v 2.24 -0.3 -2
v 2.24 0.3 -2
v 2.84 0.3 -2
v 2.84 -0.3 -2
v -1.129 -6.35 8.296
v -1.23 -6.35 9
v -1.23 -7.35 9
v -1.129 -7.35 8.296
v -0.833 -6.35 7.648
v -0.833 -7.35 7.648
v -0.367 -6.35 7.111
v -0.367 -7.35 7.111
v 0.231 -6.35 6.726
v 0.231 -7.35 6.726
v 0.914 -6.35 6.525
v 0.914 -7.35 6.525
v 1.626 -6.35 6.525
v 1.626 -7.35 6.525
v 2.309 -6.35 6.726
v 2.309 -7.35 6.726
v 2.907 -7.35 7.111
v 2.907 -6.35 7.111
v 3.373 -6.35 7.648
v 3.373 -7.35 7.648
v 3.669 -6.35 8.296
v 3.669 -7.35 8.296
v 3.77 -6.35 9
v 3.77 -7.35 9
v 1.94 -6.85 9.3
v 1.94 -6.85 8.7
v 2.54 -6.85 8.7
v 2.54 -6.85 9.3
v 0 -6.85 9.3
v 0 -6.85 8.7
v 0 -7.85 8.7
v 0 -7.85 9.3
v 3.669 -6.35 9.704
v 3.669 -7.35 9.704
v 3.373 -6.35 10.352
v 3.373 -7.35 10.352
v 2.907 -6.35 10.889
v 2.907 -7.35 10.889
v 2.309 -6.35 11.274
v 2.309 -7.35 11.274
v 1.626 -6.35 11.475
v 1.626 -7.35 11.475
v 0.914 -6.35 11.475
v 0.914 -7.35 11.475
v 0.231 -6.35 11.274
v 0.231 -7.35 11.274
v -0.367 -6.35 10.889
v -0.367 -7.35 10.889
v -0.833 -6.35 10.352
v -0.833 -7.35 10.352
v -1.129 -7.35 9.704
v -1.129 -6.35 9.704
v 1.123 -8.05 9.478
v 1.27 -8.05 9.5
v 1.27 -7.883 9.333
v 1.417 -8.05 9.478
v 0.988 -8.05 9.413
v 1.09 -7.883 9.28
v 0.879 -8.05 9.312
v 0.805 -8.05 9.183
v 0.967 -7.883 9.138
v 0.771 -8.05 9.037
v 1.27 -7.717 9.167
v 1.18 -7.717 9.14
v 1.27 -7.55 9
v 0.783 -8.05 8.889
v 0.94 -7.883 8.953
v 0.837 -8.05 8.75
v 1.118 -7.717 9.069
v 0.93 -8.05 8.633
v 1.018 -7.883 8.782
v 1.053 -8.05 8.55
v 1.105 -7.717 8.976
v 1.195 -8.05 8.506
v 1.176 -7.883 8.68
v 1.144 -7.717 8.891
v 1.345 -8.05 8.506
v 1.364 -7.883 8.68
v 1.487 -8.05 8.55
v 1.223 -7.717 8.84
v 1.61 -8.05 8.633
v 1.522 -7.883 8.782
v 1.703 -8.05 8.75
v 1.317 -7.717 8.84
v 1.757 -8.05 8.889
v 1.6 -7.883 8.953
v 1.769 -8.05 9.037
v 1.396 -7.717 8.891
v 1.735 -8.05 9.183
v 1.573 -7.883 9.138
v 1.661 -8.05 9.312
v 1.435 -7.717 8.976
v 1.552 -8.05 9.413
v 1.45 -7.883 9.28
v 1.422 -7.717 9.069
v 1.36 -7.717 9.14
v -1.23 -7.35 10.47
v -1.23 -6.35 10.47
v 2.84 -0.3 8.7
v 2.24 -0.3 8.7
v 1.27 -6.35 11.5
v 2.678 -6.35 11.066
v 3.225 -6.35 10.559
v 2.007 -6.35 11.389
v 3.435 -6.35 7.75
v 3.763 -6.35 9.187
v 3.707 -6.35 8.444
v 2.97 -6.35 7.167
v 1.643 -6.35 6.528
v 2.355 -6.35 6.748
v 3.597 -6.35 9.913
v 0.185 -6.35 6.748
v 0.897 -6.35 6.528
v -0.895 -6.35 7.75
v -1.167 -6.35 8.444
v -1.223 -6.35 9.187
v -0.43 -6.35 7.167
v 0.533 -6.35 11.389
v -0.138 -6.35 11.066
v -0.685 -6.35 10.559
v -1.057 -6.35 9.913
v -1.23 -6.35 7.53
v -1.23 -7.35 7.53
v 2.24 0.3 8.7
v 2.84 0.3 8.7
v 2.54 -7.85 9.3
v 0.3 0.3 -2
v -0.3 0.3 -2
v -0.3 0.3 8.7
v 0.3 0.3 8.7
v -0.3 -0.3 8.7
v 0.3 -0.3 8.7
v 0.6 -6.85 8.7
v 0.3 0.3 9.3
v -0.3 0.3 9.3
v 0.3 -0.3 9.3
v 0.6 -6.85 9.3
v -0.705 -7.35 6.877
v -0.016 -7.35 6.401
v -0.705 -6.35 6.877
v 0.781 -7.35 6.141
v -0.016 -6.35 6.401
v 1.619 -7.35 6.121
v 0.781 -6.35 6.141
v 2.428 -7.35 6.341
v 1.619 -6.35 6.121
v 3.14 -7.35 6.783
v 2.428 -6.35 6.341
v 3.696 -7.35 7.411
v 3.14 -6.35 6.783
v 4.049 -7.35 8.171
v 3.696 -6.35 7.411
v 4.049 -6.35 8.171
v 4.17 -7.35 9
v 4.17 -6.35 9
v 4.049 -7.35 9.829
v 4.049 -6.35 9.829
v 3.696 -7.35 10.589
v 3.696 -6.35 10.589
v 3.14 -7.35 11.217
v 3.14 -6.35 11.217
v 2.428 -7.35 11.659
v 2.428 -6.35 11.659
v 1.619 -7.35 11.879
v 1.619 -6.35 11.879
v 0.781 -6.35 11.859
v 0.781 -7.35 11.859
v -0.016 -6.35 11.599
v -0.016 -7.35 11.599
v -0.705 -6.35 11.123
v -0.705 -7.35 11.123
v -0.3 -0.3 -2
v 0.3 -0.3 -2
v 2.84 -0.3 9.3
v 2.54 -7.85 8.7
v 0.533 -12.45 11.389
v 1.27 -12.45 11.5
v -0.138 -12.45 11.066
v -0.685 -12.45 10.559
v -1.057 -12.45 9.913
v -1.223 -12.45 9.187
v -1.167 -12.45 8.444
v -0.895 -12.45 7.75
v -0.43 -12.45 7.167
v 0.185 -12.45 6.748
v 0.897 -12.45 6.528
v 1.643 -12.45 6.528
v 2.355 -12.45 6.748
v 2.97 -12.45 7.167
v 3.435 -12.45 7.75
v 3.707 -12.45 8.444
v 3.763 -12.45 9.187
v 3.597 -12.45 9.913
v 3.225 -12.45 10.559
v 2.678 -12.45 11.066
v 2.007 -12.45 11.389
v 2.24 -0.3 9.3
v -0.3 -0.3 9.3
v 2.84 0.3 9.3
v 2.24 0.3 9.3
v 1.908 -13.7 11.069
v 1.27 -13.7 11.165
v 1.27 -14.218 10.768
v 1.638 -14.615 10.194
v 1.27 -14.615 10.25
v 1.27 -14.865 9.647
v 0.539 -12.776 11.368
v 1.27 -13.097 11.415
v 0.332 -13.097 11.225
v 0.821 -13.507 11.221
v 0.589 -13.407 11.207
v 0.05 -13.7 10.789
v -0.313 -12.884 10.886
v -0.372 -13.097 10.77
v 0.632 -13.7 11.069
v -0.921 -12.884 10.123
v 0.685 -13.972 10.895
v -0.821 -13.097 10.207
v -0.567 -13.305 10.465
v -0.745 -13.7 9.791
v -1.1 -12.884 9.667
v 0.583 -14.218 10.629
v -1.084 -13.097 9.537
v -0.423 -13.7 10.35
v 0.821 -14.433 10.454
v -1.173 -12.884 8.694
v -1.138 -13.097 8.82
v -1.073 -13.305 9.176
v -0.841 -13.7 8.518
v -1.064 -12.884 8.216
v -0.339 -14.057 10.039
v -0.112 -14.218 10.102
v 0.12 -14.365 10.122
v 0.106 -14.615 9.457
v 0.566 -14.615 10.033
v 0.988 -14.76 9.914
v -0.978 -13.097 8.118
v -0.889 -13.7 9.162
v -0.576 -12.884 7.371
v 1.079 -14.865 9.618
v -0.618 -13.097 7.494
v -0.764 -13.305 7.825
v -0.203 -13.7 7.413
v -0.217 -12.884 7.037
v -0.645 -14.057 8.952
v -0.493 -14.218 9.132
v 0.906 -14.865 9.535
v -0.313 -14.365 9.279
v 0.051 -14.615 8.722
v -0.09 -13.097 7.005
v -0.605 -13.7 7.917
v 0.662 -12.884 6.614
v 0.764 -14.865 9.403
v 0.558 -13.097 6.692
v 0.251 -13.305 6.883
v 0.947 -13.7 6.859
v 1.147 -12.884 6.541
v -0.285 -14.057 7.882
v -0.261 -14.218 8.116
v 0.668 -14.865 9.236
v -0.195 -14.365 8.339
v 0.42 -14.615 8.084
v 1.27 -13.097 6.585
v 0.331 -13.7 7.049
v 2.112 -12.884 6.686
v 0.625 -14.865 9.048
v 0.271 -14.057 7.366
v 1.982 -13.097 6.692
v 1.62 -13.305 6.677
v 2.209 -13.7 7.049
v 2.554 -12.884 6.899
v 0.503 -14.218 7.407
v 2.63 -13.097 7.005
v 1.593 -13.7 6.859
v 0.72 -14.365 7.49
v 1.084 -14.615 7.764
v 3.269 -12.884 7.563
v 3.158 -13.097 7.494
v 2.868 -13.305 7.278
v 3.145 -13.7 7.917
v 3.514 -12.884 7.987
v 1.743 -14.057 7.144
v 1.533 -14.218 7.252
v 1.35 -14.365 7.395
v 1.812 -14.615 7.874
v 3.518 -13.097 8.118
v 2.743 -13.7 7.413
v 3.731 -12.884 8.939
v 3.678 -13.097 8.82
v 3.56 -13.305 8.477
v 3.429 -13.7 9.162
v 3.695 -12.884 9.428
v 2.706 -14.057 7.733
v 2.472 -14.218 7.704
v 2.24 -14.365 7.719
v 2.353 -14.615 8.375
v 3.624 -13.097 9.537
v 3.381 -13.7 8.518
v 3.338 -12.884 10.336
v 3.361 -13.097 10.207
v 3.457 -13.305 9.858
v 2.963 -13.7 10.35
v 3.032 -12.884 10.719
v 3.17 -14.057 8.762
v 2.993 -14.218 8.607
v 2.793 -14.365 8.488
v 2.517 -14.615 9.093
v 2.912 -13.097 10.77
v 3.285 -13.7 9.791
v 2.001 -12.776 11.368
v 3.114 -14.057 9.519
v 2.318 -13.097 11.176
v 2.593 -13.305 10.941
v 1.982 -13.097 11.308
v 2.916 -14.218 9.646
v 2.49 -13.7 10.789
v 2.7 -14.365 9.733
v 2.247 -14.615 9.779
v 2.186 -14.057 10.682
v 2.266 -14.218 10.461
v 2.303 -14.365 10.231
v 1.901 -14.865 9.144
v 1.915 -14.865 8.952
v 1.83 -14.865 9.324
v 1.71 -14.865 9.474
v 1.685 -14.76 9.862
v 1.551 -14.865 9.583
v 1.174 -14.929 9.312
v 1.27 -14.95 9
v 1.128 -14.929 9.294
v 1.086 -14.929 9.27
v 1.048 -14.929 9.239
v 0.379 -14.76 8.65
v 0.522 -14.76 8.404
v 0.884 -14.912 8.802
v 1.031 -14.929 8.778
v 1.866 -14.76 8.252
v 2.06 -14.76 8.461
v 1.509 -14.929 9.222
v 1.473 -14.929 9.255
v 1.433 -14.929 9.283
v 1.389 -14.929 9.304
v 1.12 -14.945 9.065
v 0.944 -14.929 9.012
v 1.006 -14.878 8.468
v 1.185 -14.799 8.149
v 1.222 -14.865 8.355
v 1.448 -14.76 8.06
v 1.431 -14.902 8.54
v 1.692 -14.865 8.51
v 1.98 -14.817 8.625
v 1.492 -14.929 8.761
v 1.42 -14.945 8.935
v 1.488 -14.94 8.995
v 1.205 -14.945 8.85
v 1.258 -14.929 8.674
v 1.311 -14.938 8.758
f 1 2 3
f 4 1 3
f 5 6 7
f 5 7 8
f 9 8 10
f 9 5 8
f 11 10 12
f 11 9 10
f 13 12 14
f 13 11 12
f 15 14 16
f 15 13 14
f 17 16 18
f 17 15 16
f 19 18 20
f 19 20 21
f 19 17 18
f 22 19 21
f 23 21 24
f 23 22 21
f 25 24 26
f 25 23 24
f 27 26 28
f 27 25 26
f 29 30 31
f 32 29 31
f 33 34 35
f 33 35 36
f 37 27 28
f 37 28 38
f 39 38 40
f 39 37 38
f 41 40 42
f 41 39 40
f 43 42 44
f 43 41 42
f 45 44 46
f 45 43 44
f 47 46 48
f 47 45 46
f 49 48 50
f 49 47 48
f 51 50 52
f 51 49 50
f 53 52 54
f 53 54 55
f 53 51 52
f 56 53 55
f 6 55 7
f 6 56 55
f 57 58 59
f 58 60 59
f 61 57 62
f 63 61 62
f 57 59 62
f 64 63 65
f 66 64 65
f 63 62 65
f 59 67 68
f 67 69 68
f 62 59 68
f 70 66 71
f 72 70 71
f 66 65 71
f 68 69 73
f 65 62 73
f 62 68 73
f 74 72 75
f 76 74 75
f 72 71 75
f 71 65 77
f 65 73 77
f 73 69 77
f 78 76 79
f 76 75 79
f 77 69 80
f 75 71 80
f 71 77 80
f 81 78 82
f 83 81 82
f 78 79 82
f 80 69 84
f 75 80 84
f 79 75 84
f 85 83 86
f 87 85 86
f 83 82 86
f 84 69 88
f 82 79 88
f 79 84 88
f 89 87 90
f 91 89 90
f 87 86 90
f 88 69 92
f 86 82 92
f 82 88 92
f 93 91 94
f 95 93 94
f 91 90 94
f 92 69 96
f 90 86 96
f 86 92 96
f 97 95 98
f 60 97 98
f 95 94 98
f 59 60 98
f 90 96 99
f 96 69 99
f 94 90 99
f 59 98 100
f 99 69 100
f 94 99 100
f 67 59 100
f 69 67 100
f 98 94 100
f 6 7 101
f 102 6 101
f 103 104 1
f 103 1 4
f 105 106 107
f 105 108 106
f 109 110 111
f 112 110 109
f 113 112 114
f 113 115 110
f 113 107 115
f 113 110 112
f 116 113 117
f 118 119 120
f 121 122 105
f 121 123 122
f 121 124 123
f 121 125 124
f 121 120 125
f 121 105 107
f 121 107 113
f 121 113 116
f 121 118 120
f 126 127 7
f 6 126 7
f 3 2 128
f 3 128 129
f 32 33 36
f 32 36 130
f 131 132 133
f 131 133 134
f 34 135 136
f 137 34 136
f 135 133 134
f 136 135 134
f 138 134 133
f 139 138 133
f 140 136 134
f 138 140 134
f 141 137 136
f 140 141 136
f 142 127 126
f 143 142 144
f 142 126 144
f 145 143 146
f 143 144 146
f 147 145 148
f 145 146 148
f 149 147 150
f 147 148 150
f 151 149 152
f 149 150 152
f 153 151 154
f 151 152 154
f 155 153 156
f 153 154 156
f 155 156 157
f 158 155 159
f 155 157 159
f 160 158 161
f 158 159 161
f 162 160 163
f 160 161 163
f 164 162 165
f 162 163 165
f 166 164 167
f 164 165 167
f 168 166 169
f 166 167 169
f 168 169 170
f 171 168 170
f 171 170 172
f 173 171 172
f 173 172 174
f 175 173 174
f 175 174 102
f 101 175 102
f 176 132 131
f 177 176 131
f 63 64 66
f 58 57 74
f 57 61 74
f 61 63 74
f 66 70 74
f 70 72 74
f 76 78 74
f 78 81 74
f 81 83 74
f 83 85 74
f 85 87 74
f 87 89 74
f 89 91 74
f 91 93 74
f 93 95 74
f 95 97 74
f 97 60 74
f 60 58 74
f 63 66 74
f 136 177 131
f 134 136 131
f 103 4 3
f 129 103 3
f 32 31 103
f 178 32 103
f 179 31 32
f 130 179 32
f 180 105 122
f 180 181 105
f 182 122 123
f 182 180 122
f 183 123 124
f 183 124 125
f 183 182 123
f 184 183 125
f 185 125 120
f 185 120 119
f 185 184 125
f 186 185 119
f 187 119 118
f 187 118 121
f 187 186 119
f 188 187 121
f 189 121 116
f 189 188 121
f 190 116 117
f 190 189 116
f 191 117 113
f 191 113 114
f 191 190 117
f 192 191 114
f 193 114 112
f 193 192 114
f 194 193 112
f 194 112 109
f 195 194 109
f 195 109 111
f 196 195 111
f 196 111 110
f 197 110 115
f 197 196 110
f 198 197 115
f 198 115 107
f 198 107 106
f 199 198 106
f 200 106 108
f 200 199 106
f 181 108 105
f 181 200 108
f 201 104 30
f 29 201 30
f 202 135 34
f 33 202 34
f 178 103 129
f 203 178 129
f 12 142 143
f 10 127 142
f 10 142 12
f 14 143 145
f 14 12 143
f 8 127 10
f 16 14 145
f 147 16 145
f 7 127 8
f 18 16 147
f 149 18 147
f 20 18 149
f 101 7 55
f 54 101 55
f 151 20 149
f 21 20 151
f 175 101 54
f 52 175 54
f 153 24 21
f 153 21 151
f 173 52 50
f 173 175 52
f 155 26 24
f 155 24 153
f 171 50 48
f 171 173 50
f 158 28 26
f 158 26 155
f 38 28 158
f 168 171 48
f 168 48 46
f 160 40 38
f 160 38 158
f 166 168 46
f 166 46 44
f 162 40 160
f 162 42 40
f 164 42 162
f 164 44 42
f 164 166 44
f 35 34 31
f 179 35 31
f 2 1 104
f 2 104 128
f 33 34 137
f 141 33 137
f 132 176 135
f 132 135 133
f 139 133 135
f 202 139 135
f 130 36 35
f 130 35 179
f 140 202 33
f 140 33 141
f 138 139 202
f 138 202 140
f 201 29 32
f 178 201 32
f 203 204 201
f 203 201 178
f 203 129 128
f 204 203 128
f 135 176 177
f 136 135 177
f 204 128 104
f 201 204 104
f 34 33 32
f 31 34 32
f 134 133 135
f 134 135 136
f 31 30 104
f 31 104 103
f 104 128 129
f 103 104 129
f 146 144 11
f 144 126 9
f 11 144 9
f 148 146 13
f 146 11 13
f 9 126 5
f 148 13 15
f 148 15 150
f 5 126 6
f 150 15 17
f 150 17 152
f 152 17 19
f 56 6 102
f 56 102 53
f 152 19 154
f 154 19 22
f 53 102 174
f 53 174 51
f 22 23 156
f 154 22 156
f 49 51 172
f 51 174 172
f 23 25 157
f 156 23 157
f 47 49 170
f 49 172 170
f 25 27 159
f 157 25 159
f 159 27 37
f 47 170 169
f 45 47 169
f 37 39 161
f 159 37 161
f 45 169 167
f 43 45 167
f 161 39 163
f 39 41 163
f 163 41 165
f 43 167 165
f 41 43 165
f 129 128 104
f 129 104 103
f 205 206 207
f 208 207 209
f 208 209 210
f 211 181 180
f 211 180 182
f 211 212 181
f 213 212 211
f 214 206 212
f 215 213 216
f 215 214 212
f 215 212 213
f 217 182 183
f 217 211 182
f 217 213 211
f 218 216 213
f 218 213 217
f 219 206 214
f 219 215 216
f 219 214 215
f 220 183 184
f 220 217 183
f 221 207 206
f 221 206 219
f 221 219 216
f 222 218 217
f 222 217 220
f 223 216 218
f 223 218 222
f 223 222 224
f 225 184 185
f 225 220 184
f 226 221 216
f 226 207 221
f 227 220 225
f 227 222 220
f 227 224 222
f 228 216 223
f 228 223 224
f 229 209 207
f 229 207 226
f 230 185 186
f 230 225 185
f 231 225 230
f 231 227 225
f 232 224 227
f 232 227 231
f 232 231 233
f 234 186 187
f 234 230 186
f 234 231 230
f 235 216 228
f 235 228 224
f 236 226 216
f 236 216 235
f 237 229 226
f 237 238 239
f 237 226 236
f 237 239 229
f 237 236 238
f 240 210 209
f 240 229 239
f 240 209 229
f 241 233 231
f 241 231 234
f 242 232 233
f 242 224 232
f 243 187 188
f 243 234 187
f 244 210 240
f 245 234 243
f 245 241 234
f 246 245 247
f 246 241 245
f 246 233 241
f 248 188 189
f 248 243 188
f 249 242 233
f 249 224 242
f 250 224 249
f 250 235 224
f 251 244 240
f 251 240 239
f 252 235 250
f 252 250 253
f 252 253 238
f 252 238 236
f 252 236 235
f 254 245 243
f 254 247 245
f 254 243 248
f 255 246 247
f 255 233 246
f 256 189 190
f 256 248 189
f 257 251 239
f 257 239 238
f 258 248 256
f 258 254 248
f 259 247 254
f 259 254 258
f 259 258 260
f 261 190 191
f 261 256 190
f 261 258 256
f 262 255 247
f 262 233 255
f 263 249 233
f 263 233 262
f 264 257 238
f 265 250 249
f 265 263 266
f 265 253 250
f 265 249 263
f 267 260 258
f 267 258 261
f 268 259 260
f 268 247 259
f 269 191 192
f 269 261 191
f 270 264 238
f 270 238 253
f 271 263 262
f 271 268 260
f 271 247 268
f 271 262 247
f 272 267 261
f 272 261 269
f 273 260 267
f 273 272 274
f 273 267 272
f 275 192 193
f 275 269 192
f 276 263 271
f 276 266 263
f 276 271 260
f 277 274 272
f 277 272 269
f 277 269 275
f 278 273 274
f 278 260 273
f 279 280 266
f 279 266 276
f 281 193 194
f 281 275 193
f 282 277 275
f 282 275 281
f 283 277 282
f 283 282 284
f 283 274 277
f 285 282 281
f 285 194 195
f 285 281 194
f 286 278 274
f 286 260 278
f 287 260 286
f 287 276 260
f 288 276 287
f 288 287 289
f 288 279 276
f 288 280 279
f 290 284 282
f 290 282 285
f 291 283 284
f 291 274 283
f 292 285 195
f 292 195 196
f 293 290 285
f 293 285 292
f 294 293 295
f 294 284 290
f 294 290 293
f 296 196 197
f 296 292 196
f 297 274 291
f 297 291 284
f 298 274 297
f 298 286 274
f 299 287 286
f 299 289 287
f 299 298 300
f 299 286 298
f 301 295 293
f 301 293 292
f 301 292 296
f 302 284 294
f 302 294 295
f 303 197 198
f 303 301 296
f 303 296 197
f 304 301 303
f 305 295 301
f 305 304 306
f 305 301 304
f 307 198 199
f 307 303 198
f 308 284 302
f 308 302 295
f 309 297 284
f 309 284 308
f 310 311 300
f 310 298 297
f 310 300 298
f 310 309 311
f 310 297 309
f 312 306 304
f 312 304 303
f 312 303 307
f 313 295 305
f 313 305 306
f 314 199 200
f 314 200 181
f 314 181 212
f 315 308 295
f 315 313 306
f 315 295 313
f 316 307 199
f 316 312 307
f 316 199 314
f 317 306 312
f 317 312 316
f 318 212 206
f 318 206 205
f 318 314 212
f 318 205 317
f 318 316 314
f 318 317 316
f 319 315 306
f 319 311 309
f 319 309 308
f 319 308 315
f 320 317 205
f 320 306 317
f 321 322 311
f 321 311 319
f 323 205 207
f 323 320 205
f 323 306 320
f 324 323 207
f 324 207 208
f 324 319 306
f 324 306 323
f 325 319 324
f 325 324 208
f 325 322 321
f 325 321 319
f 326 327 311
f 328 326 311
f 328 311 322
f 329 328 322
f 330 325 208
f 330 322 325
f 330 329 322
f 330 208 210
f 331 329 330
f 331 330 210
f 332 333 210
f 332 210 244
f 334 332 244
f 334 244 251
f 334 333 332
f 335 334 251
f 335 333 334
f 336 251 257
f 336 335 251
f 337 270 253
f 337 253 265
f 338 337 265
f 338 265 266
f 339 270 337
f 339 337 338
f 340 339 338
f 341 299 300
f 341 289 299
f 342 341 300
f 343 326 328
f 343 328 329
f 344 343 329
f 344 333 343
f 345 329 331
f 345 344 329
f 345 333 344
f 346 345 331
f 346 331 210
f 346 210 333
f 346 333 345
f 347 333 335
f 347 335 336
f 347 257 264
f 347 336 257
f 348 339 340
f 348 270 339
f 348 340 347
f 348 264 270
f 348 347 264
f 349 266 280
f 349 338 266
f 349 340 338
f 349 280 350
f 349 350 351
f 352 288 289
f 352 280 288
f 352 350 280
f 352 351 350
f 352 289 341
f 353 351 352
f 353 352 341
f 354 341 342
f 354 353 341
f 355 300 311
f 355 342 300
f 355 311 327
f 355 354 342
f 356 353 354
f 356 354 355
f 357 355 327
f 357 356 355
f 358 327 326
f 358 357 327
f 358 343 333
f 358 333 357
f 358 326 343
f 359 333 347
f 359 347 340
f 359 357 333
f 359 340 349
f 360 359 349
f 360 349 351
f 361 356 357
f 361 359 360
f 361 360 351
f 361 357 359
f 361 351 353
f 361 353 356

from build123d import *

# Parameters (mm, degrees)
SKETCH_W       = 0.6
SKETCH_H       = 0.6
PAD_DEPTH      = 8.7
PAD_DEPTH_BACK = 2
PAD001_DEPTH   = 0.6
SKETCH002_W    = 2.54
SKETCH002_H    = 0.6
PAD002_DEPTH   = 1
SKETCH004_R    = 2.9
SKETCH004_R_2  = 2.5
PAD003_DEPTH   = 1
SKETCH006_W    = 0.4
SKETCH006_H    = 5.8
POCKET_DEPTH   = 1.001


with BuildPart() as pad:
    # Sketch → Pad (new body, two sides)
    with BuildSketch(Plane.XY) as pad_sk:
        Rectangle(SKETCH_W, SKETCH_H)
        with Locations((2.54, 0)):
            Rectangle(SKETCH_W, SKETCH_H)
    extrude(amount=PAD_DEPTH)
    extrude(pad_sk.sketch, amount=-PAD_DEPTH_BACK)


with BuildPart() as pad001:
    # Sketch001 → Pad001 (new body)
    with BuildSketch(Plane.XY.offset(8.7)):
        Polygon((0.3, 0.3), (-0.3, 0.3), (-0.3, -0.3), (0, -6.85), (0.6, -6.85), (0.3, -0.3), align=None)
        Polygon((2.84, 0.3), (2.24, 0.3), (2.24, -0.3), (1.94, -6.85), (2.54, -6.85), (2.84, -0.3), align=None)
    extrude(amount=PAD001_DEPTH)


with BuildPart() as pad002:
    # Sketch002 → Pad002 (new body)
    with BuildSketch(Plane.XZ.offset(6.85)):
        with Locations((1.27, 9)):
            Rectangle(SKETCH002_W, SKETCH002_H)
    extrude(amount=PAD002_DEPTH)


with BuildPart() as revolution:
    # Sketch003 → Revolution (revolve)
    with BuildSketch(Plane.YZ.offset(1.27)):
        with BuildLine():
            Line((-6.35, 9), (-14.95, 9))
            ThreePointArc((-12.45, 11.5), (-14.217767, 10.767767), (-14.95, 9))
            Line((-6.35, 11.5), (-12.45, 11.5))
            Line((-6.35, 9), (-6.35, 11.5))
        make_face()
    revolve(axis=Axis((1.27, -5.810397, 9), (0, -1, 0)))


with BuildPart() as revolution001:
    # Sketch005 → Revolution001 (revolve)
    with BuildSketch(Plane.YZ.offset(1.27)):
        Polygon((-7.55, 9), (-8.05, 9), (-8.05, 9.5), align=None)
    revolve(axis=Axis((1.27, -3.977201, 9), (0, -1, 0)))


with BuildPart() as pocket:
    # Sketch004 → Pad003 (new body)
    with BuildSketch(Plane.XZ.offset(6.35)):
        with Locations((1.27, 9)):
            Circle(SKETCH004_R)
        with Locations((1.27, 9)):
            Circle(SKETCH004_R_2, mode=Mode.SUBTRACT)
    extrude(amount=PAD003_DEPTH)

    # Sketch006 → Pocket (cut, through all)
    with BuildSketch(Plane.XZ.offset(7.35)):
        with Locations((-1.43, 9)):
            Rectangle(SKETCH006_W, SKETCH006_H)
    extrude(amount=-POCKET_DEPTH, mode=Mode.SUBTRACT)


solid = Compound([pad.part, pad001.part, pad002.part, revolution.part, revolution001.part, pocket.part])
